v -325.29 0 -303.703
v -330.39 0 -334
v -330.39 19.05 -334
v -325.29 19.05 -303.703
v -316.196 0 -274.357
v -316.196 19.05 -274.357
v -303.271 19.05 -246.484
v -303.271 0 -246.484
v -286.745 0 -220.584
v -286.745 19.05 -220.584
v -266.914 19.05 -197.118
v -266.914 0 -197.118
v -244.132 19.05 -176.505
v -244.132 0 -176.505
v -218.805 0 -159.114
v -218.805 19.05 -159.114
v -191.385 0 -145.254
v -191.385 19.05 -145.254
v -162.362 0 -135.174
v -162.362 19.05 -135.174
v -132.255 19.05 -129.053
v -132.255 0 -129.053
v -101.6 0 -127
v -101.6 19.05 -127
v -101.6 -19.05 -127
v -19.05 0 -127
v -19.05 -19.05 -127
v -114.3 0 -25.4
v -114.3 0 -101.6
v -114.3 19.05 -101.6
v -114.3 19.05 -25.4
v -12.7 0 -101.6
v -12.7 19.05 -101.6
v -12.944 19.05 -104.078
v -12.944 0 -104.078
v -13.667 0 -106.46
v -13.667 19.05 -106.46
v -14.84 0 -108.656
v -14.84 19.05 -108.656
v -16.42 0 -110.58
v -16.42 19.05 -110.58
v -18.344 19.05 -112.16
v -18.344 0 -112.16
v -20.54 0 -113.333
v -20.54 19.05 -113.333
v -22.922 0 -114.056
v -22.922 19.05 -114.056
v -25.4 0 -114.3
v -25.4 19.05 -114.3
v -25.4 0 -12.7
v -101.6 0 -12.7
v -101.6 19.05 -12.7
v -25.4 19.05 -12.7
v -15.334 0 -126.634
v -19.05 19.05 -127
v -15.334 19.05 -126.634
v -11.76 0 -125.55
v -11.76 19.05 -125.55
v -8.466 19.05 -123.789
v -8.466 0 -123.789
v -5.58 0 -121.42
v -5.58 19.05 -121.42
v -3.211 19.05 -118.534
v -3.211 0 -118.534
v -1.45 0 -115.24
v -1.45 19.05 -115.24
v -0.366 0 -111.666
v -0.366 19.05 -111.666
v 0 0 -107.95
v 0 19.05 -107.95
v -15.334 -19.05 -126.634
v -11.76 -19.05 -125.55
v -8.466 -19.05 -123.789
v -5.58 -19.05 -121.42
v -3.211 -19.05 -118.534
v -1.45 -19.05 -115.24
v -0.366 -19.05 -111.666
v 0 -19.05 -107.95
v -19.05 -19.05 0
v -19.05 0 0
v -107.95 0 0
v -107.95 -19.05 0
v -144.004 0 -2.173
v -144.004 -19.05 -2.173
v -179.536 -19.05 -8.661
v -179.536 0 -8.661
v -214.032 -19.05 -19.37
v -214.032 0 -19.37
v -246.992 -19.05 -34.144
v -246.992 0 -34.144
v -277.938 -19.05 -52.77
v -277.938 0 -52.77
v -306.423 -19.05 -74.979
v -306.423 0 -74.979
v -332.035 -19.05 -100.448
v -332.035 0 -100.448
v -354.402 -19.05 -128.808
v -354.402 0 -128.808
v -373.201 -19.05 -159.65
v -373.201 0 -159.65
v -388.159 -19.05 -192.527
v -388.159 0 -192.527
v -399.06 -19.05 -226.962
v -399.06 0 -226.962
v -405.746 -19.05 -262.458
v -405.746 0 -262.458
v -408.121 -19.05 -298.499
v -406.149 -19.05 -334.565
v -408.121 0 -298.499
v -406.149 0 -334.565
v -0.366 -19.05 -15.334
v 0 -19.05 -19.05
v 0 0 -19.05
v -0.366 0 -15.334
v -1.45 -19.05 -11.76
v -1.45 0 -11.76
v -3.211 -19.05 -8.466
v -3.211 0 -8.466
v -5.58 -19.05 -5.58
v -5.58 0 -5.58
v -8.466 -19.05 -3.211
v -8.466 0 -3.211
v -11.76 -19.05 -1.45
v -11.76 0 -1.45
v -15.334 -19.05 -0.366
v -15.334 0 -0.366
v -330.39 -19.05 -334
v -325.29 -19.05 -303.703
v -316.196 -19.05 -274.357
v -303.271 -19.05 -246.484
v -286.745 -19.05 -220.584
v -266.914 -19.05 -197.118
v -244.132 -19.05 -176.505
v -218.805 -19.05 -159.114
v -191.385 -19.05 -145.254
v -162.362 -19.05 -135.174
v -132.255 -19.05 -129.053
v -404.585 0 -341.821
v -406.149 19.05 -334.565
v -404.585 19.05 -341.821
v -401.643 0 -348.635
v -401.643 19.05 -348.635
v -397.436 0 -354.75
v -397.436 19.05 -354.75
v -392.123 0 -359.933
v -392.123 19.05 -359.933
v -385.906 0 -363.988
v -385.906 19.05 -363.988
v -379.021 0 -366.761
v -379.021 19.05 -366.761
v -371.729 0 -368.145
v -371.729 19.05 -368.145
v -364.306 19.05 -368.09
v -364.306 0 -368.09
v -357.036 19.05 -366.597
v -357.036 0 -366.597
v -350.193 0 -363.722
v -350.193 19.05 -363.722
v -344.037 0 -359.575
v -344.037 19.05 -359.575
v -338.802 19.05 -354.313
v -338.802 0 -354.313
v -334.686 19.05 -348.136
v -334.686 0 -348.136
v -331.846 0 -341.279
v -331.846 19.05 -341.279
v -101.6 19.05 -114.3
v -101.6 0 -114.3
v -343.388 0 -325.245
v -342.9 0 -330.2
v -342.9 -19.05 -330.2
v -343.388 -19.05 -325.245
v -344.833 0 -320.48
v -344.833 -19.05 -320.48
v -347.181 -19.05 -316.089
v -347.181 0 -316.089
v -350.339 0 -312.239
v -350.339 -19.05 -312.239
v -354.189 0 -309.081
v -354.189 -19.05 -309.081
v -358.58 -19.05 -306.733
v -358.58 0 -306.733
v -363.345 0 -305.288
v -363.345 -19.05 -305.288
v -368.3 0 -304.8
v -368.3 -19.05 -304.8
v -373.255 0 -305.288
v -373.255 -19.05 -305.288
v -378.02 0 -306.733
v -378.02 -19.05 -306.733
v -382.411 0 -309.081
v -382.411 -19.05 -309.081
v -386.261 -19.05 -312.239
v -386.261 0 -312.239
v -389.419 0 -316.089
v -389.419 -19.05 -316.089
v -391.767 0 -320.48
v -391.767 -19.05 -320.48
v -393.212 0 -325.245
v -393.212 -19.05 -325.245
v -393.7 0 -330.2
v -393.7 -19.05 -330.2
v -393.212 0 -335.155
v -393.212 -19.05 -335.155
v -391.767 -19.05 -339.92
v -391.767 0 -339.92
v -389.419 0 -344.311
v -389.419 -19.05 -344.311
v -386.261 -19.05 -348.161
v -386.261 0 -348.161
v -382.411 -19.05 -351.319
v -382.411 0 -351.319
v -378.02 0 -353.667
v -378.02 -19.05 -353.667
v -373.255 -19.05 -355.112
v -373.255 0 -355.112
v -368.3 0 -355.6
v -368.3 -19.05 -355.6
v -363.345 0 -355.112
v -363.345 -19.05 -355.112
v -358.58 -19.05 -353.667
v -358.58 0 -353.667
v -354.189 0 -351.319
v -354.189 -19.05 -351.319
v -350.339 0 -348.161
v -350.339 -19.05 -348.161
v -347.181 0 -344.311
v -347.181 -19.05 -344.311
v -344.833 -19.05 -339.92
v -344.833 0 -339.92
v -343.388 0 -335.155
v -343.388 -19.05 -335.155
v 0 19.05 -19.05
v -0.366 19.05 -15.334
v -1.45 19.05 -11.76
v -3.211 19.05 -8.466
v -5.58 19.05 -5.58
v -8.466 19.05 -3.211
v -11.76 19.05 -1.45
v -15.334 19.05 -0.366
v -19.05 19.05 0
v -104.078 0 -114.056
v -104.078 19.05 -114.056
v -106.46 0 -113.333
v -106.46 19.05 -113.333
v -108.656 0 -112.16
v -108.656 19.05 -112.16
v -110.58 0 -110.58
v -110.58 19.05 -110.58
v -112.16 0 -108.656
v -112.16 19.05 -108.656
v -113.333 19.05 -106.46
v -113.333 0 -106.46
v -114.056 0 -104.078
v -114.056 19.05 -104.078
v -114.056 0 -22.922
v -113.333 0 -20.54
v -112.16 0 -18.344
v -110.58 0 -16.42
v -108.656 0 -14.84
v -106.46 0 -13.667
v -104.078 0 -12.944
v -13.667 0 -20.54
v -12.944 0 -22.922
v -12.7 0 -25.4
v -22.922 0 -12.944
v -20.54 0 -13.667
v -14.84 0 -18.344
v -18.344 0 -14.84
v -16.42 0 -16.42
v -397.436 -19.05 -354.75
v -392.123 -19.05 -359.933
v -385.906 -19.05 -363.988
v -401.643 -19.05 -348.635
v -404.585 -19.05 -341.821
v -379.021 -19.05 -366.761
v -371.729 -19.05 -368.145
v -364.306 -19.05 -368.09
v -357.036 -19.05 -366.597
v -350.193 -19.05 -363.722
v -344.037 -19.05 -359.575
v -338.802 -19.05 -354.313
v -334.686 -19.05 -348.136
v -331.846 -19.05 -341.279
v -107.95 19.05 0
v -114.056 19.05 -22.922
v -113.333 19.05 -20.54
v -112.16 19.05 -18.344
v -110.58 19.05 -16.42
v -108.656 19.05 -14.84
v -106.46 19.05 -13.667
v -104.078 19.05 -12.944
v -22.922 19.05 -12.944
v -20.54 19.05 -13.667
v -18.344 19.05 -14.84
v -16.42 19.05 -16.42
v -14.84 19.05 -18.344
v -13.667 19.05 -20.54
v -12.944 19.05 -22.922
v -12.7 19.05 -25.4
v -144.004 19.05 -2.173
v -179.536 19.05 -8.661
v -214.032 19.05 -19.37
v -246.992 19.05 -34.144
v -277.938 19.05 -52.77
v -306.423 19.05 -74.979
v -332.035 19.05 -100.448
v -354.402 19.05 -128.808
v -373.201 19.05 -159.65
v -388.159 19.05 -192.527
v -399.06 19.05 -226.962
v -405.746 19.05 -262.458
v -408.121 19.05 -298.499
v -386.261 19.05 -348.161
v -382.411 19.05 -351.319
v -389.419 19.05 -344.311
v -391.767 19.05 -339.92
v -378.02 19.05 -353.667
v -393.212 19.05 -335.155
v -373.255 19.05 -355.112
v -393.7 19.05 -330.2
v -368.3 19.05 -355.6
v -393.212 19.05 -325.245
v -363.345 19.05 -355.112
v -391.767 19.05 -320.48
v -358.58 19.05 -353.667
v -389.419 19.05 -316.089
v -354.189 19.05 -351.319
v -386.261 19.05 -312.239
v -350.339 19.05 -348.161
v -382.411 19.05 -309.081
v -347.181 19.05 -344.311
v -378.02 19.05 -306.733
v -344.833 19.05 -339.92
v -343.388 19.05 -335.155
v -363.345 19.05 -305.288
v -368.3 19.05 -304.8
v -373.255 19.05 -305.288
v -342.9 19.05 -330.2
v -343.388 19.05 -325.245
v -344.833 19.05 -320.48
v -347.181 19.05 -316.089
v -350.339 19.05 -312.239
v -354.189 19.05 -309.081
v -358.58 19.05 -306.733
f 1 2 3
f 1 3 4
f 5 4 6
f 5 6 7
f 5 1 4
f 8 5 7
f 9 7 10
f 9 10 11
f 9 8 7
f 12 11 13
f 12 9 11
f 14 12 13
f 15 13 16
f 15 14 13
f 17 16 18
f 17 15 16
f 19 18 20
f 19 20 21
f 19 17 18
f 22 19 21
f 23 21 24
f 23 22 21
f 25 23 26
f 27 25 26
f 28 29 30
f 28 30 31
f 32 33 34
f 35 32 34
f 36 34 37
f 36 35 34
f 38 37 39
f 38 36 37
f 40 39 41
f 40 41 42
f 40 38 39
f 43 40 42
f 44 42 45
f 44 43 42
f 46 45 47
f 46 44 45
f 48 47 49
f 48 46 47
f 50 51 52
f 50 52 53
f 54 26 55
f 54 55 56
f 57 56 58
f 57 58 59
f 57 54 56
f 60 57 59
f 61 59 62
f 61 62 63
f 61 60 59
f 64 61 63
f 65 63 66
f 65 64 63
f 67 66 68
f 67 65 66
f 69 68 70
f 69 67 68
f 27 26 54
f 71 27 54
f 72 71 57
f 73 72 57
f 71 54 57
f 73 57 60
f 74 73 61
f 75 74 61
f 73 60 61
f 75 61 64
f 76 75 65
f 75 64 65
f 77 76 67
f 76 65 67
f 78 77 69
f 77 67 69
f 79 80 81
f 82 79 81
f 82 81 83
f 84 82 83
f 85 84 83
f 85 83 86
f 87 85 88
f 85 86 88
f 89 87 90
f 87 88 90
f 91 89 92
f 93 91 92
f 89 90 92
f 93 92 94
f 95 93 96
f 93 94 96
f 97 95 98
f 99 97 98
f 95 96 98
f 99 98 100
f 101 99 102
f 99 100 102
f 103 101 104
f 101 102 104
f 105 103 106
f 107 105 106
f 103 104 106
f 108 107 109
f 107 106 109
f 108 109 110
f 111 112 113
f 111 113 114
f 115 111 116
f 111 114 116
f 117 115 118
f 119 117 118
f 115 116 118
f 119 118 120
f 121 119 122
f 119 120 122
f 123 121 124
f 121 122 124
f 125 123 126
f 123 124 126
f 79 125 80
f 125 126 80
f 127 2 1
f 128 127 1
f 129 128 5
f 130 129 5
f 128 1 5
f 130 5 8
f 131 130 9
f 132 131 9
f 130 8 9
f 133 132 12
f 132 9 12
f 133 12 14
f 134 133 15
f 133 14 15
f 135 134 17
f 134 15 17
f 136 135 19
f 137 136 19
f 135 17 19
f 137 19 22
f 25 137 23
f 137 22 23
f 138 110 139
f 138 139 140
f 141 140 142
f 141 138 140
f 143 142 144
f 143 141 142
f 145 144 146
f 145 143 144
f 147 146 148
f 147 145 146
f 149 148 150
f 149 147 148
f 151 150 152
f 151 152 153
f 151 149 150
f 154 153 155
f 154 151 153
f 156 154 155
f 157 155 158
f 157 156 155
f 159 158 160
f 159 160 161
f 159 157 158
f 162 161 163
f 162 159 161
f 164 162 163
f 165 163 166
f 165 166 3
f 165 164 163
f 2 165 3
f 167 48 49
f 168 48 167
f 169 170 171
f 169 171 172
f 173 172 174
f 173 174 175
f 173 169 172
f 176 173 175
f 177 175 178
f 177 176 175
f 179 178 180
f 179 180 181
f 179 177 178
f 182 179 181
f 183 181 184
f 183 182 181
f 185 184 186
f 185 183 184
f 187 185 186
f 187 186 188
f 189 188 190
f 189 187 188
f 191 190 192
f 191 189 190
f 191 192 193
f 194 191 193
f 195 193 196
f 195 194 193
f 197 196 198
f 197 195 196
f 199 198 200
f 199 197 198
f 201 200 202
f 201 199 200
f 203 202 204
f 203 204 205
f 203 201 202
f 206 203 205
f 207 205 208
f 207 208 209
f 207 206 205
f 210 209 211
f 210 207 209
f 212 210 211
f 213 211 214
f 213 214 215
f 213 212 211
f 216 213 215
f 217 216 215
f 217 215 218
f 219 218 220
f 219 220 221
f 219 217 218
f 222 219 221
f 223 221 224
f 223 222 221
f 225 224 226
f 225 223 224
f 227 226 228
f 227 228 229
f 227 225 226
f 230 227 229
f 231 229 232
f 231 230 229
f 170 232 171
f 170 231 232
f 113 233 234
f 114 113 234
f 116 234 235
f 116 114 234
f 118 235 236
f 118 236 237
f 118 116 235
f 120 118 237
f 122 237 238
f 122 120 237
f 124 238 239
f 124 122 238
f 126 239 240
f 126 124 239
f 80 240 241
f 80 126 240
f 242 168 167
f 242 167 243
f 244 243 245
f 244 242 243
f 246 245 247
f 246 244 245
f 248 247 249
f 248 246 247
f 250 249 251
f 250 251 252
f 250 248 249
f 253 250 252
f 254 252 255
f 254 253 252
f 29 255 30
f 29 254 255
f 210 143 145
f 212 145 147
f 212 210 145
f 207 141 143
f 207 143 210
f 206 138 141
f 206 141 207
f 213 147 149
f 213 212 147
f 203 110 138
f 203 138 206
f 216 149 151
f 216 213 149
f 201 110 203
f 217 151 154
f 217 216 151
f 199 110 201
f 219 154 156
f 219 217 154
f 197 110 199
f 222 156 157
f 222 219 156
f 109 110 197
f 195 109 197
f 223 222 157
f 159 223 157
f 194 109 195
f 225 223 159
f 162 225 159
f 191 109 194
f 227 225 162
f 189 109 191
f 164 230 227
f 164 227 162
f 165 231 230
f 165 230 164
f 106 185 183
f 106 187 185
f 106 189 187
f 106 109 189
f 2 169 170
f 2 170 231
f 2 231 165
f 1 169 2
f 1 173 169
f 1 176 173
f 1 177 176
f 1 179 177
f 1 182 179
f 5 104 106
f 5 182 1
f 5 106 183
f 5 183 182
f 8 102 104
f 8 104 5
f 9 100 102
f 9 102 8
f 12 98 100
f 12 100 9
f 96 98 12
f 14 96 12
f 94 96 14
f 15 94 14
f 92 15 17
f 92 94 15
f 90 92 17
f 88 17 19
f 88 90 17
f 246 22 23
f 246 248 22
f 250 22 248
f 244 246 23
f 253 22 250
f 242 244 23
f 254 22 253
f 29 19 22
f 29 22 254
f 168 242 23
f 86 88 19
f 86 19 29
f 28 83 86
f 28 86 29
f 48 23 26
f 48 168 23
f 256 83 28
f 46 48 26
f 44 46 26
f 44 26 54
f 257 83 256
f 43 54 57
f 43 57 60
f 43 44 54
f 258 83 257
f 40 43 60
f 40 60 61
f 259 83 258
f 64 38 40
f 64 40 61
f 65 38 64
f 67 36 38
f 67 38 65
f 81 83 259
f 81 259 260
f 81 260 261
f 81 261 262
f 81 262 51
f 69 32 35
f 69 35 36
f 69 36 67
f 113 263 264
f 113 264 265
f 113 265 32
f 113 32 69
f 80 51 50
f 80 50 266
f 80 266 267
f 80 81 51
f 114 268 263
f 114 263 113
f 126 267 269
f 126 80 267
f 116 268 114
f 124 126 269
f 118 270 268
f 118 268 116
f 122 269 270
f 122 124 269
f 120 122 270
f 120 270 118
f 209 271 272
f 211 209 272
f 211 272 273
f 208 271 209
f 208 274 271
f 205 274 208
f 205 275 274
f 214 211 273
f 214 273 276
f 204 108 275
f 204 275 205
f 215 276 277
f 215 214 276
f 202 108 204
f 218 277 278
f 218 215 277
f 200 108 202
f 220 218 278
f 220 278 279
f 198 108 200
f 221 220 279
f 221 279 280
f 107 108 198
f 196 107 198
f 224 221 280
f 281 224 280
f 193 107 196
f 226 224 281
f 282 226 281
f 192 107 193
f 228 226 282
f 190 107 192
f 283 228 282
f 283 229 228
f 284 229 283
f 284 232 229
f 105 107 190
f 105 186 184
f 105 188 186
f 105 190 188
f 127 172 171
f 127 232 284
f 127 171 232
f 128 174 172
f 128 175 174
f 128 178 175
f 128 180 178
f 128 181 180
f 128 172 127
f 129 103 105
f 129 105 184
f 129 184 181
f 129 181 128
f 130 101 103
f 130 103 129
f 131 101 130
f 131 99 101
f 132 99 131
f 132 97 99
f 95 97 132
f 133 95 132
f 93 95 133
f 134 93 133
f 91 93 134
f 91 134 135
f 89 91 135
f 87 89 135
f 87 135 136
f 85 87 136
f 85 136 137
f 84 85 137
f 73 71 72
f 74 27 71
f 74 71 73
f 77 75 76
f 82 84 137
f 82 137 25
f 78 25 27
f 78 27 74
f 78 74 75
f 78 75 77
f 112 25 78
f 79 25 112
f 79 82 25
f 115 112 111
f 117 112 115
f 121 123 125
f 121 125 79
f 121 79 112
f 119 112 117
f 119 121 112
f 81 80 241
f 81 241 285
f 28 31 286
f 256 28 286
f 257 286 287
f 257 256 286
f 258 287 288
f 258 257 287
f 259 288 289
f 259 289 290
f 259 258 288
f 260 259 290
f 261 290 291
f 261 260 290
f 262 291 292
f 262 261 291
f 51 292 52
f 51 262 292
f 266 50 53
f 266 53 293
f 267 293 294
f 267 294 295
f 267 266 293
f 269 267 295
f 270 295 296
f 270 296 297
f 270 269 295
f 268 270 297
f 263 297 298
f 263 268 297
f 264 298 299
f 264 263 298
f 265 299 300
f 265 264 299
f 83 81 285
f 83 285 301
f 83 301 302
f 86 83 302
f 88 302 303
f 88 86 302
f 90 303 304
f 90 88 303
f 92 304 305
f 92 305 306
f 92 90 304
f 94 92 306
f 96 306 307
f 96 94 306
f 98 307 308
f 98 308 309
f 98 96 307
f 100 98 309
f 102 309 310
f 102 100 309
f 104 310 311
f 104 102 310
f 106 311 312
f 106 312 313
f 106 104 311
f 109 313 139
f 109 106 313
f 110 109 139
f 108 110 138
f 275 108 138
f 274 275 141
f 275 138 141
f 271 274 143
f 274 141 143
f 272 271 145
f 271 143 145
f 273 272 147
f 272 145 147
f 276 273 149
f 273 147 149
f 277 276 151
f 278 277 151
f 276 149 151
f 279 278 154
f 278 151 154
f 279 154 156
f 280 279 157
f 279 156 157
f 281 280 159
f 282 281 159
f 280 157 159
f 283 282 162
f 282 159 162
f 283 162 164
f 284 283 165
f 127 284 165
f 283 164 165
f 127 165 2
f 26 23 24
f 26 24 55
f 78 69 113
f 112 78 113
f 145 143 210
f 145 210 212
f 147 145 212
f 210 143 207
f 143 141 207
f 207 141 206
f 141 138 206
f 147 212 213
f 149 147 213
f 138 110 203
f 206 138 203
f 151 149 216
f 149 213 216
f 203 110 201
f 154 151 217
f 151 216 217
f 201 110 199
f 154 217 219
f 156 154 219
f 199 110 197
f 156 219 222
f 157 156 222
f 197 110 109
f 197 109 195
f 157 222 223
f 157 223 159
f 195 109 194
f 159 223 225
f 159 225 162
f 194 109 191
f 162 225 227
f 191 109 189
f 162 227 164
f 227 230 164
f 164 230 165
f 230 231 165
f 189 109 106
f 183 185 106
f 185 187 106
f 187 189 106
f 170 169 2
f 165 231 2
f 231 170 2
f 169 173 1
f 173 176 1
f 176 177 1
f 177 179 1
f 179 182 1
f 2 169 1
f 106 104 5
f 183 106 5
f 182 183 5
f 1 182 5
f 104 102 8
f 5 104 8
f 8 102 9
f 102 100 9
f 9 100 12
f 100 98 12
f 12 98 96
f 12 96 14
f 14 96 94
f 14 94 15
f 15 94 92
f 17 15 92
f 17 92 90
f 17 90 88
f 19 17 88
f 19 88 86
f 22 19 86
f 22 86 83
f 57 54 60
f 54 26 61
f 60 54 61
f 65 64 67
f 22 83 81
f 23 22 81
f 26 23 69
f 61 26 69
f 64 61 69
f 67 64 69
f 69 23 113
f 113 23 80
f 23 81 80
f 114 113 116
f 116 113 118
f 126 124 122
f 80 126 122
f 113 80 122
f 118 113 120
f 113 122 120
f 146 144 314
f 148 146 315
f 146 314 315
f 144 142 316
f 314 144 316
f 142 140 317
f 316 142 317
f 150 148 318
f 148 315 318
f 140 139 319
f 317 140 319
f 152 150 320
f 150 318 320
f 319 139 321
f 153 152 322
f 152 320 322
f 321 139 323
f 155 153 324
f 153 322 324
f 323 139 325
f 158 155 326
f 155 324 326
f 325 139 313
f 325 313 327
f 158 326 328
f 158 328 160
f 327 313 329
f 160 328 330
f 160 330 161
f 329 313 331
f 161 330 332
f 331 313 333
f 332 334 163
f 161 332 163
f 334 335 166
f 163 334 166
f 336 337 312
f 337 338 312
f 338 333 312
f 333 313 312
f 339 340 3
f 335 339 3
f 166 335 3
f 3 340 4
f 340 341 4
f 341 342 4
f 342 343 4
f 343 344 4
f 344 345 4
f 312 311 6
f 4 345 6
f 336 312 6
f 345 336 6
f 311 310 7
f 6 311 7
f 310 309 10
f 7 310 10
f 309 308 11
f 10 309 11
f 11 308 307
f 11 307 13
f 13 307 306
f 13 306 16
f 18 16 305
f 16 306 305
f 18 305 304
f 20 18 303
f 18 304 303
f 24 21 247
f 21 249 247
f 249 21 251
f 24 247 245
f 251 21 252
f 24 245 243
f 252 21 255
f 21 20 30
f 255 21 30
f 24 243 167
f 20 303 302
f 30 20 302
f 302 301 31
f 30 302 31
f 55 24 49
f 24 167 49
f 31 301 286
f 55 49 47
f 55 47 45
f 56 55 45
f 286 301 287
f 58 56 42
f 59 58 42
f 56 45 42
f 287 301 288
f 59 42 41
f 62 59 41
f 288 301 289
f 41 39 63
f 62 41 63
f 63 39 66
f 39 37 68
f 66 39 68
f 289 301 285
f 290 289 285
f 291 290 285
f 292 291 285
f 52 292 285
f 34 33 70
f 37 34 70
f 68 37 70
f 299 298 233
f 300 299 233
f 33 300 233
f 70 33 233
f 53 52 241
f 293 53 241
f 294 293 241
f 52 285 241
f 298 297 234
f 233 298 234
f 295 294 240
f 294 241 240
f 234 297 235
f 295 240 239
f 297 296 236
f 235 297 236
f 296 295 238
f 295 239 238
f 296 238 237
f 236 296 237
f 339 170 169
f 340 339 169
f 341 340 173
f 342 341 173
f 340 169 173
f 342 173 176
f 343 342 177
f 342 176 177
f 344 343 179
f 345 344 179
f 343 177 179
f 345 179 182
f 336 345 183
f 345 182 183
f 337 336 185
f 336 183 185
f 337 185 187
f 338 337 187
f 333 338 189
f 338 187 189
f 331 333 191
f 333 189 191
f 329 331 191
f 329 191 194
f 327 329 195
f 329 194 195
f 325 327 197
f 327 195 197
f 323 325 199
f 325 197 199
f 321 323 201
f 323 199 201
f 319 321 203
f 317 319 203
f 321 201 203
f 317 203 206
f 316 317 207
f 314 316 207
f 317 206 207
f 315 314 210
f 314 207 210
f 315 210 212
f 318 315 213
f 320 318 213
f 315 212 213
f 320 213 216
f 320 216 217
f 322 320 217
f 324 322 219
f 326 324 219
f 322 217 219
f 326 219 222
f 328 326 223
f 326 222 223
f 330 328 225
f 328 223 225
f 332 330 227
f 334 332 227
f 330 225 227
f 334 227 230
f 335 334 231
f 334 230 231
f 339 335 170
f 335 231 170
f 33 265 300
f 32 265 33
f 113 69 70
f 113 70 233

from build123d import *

# Parameters (mm, degrees)
F0_R     = 25.4
F1_DEPTH = 19.05
F2_DEPTH = 19.05


with BuildPart() as f1:
    # F0 (on Front) → F1 (new body)
    with BuildSketch(Plane.XZ):
        with BuildLine():
            Line((-19.05, 0), (-107.95, 0))
            ThreePointArc((-107.95, 0), (-332.035027, -100.447585), (-406.149144, -334.564893))
            ThreePointArc((-406.149144, -334.564893), (-368.016168, -368.298943), (-330.390025, -334.000499))
            ThreePointArc((-330.390025, -334.000499), (-255.867691, -186.430447), (-101.6, -127))
            Line((-101.6, -127), (-19.05, -127))
            ThreePointArc((-19.05, -127), (-5.579616, -121.420384), (0, -107.95))
            Line((0, -107.95), (0, -19.05))
            ThreePointArc((0, -19.05), (-5.579616, -5.579616), (-19.05, 0))
        make_face()
        with Locations((-368.3, -330.2)):
            Circle(F0_R, mode=Mode.SUBTRACT)
        with BuildLine():
            ThreePointArc((-114.3, -25.4), (-110.580256, -16.419744), (-101.6, -12.7))
            Line((-101.6, -12.7), (-25.4, -12.7))
            ThreePointArc((-25.4, -12.7), (-16.419744, -16.419744), (-12.7, -25.4))
            Line((-12.7, -25.4), (-12.7, -101.6))
            ThreePointArc((-12.7, -101.6), (-16.419744, -110.580256), (-25.4, -114.3))
            Line((-25.4, -114.3), (-101.6, -114.3))
            ThreePointArc((-101.6, -114.3), (-110.580256, -110.580256), (-114.3, -101.6))
            Line((-114.3, -101.6), (-114.3, -25.4))
        make_face(mode=Mode.SUBTRACT)
        with BuildLine():
            Line((-25.4, -12.7), (-101.6, -12.7))
            ThreePointArc((-101.6, -12.7), (-110.580256, -16.419744), (-114.3, -25.4))
            Line((-114.3, -25.4), (-114.3, -101.6))
            ThreePointArc((-114.3, -101.6), (-110.580256, -110.580256), (-101.6, -114.3))
            Line((-101.6, -114.3), (-25.4, -114.3))
            ThreePointArc((-25.4, -114.3), (-16.419744, -110.580256), (-12.7, -101.6))
            Line((-12.7, -101.6), (-12.7, -25.4))
            ThreePointArc((-12.7, -25.4), (-16.419744, -16.419744), (-25.4, -12.7))
        make_face()
    extrude(amount=F1_DEPTH)


with BuildPart() as f2:
    # F0 (on Front) → F2 (new body)
    with BuildSketch(Plane.XZ):
        with BuildLine():
            Line((-19.05, 0), (-107.95, 0))
            ThreePointArc((-107.95, 0), (-332.035027, -100.447585), (-406.149144, -334.564893))
            ThreePointArc((-406.149144, -334.564893), (-368.016168, -368.298943), (-330.390025, -334.000499))
            ThreePointArc((-330.390025, -334.000499), (-255.867691, -186.430447), (-101.6, -127))
            Line((-101.6, -127), (-19.05, -127))
            ThreePointArc((-19.05, -127), (-5.579616, -121.420384), (0, -107.95))
            Line((0, -107.95), (0, -19.05))
            ThreePointArc((0, -19.05), (-5.579616, -5.579616), (-19.05, 0))
        make_face()
        with Locations((-368.3, -330.2)):
            Circle(F0_R, mode=Mode.SUBTRACT)
        with BuildLine():
            ThreePointArc((-114.3, -25.4), (-110.580256, -16.419744), (-101.6, -12.7))
            Line((-101.6, -12.7), (-25.4, -12.7))
            ThreePointArc((-25.4, -12.7), (-16.419744, -16.419744), (-12.7, -25.4))
            Line((-12.7, -25.4), (-12.7, -101.6))
            ThreePointArc((-12.7, -101.6), (-16.419744, -110.580256), (-25.4, -114.3))
            Line((-25.4, -114.3), (-101.6, -114.3))
            ThreePointArc((-101.6, -114.3), (-110.580256, -110.580256), (-114.3, -101.6))
            Line((-114.3, -101.6), (-114.3, -25.4))
        make_face(mode=Mode.SUBTRACT)
    extrude(amount=-F2_DEPTH)


solid = Compound([f1.part, f2.part])
